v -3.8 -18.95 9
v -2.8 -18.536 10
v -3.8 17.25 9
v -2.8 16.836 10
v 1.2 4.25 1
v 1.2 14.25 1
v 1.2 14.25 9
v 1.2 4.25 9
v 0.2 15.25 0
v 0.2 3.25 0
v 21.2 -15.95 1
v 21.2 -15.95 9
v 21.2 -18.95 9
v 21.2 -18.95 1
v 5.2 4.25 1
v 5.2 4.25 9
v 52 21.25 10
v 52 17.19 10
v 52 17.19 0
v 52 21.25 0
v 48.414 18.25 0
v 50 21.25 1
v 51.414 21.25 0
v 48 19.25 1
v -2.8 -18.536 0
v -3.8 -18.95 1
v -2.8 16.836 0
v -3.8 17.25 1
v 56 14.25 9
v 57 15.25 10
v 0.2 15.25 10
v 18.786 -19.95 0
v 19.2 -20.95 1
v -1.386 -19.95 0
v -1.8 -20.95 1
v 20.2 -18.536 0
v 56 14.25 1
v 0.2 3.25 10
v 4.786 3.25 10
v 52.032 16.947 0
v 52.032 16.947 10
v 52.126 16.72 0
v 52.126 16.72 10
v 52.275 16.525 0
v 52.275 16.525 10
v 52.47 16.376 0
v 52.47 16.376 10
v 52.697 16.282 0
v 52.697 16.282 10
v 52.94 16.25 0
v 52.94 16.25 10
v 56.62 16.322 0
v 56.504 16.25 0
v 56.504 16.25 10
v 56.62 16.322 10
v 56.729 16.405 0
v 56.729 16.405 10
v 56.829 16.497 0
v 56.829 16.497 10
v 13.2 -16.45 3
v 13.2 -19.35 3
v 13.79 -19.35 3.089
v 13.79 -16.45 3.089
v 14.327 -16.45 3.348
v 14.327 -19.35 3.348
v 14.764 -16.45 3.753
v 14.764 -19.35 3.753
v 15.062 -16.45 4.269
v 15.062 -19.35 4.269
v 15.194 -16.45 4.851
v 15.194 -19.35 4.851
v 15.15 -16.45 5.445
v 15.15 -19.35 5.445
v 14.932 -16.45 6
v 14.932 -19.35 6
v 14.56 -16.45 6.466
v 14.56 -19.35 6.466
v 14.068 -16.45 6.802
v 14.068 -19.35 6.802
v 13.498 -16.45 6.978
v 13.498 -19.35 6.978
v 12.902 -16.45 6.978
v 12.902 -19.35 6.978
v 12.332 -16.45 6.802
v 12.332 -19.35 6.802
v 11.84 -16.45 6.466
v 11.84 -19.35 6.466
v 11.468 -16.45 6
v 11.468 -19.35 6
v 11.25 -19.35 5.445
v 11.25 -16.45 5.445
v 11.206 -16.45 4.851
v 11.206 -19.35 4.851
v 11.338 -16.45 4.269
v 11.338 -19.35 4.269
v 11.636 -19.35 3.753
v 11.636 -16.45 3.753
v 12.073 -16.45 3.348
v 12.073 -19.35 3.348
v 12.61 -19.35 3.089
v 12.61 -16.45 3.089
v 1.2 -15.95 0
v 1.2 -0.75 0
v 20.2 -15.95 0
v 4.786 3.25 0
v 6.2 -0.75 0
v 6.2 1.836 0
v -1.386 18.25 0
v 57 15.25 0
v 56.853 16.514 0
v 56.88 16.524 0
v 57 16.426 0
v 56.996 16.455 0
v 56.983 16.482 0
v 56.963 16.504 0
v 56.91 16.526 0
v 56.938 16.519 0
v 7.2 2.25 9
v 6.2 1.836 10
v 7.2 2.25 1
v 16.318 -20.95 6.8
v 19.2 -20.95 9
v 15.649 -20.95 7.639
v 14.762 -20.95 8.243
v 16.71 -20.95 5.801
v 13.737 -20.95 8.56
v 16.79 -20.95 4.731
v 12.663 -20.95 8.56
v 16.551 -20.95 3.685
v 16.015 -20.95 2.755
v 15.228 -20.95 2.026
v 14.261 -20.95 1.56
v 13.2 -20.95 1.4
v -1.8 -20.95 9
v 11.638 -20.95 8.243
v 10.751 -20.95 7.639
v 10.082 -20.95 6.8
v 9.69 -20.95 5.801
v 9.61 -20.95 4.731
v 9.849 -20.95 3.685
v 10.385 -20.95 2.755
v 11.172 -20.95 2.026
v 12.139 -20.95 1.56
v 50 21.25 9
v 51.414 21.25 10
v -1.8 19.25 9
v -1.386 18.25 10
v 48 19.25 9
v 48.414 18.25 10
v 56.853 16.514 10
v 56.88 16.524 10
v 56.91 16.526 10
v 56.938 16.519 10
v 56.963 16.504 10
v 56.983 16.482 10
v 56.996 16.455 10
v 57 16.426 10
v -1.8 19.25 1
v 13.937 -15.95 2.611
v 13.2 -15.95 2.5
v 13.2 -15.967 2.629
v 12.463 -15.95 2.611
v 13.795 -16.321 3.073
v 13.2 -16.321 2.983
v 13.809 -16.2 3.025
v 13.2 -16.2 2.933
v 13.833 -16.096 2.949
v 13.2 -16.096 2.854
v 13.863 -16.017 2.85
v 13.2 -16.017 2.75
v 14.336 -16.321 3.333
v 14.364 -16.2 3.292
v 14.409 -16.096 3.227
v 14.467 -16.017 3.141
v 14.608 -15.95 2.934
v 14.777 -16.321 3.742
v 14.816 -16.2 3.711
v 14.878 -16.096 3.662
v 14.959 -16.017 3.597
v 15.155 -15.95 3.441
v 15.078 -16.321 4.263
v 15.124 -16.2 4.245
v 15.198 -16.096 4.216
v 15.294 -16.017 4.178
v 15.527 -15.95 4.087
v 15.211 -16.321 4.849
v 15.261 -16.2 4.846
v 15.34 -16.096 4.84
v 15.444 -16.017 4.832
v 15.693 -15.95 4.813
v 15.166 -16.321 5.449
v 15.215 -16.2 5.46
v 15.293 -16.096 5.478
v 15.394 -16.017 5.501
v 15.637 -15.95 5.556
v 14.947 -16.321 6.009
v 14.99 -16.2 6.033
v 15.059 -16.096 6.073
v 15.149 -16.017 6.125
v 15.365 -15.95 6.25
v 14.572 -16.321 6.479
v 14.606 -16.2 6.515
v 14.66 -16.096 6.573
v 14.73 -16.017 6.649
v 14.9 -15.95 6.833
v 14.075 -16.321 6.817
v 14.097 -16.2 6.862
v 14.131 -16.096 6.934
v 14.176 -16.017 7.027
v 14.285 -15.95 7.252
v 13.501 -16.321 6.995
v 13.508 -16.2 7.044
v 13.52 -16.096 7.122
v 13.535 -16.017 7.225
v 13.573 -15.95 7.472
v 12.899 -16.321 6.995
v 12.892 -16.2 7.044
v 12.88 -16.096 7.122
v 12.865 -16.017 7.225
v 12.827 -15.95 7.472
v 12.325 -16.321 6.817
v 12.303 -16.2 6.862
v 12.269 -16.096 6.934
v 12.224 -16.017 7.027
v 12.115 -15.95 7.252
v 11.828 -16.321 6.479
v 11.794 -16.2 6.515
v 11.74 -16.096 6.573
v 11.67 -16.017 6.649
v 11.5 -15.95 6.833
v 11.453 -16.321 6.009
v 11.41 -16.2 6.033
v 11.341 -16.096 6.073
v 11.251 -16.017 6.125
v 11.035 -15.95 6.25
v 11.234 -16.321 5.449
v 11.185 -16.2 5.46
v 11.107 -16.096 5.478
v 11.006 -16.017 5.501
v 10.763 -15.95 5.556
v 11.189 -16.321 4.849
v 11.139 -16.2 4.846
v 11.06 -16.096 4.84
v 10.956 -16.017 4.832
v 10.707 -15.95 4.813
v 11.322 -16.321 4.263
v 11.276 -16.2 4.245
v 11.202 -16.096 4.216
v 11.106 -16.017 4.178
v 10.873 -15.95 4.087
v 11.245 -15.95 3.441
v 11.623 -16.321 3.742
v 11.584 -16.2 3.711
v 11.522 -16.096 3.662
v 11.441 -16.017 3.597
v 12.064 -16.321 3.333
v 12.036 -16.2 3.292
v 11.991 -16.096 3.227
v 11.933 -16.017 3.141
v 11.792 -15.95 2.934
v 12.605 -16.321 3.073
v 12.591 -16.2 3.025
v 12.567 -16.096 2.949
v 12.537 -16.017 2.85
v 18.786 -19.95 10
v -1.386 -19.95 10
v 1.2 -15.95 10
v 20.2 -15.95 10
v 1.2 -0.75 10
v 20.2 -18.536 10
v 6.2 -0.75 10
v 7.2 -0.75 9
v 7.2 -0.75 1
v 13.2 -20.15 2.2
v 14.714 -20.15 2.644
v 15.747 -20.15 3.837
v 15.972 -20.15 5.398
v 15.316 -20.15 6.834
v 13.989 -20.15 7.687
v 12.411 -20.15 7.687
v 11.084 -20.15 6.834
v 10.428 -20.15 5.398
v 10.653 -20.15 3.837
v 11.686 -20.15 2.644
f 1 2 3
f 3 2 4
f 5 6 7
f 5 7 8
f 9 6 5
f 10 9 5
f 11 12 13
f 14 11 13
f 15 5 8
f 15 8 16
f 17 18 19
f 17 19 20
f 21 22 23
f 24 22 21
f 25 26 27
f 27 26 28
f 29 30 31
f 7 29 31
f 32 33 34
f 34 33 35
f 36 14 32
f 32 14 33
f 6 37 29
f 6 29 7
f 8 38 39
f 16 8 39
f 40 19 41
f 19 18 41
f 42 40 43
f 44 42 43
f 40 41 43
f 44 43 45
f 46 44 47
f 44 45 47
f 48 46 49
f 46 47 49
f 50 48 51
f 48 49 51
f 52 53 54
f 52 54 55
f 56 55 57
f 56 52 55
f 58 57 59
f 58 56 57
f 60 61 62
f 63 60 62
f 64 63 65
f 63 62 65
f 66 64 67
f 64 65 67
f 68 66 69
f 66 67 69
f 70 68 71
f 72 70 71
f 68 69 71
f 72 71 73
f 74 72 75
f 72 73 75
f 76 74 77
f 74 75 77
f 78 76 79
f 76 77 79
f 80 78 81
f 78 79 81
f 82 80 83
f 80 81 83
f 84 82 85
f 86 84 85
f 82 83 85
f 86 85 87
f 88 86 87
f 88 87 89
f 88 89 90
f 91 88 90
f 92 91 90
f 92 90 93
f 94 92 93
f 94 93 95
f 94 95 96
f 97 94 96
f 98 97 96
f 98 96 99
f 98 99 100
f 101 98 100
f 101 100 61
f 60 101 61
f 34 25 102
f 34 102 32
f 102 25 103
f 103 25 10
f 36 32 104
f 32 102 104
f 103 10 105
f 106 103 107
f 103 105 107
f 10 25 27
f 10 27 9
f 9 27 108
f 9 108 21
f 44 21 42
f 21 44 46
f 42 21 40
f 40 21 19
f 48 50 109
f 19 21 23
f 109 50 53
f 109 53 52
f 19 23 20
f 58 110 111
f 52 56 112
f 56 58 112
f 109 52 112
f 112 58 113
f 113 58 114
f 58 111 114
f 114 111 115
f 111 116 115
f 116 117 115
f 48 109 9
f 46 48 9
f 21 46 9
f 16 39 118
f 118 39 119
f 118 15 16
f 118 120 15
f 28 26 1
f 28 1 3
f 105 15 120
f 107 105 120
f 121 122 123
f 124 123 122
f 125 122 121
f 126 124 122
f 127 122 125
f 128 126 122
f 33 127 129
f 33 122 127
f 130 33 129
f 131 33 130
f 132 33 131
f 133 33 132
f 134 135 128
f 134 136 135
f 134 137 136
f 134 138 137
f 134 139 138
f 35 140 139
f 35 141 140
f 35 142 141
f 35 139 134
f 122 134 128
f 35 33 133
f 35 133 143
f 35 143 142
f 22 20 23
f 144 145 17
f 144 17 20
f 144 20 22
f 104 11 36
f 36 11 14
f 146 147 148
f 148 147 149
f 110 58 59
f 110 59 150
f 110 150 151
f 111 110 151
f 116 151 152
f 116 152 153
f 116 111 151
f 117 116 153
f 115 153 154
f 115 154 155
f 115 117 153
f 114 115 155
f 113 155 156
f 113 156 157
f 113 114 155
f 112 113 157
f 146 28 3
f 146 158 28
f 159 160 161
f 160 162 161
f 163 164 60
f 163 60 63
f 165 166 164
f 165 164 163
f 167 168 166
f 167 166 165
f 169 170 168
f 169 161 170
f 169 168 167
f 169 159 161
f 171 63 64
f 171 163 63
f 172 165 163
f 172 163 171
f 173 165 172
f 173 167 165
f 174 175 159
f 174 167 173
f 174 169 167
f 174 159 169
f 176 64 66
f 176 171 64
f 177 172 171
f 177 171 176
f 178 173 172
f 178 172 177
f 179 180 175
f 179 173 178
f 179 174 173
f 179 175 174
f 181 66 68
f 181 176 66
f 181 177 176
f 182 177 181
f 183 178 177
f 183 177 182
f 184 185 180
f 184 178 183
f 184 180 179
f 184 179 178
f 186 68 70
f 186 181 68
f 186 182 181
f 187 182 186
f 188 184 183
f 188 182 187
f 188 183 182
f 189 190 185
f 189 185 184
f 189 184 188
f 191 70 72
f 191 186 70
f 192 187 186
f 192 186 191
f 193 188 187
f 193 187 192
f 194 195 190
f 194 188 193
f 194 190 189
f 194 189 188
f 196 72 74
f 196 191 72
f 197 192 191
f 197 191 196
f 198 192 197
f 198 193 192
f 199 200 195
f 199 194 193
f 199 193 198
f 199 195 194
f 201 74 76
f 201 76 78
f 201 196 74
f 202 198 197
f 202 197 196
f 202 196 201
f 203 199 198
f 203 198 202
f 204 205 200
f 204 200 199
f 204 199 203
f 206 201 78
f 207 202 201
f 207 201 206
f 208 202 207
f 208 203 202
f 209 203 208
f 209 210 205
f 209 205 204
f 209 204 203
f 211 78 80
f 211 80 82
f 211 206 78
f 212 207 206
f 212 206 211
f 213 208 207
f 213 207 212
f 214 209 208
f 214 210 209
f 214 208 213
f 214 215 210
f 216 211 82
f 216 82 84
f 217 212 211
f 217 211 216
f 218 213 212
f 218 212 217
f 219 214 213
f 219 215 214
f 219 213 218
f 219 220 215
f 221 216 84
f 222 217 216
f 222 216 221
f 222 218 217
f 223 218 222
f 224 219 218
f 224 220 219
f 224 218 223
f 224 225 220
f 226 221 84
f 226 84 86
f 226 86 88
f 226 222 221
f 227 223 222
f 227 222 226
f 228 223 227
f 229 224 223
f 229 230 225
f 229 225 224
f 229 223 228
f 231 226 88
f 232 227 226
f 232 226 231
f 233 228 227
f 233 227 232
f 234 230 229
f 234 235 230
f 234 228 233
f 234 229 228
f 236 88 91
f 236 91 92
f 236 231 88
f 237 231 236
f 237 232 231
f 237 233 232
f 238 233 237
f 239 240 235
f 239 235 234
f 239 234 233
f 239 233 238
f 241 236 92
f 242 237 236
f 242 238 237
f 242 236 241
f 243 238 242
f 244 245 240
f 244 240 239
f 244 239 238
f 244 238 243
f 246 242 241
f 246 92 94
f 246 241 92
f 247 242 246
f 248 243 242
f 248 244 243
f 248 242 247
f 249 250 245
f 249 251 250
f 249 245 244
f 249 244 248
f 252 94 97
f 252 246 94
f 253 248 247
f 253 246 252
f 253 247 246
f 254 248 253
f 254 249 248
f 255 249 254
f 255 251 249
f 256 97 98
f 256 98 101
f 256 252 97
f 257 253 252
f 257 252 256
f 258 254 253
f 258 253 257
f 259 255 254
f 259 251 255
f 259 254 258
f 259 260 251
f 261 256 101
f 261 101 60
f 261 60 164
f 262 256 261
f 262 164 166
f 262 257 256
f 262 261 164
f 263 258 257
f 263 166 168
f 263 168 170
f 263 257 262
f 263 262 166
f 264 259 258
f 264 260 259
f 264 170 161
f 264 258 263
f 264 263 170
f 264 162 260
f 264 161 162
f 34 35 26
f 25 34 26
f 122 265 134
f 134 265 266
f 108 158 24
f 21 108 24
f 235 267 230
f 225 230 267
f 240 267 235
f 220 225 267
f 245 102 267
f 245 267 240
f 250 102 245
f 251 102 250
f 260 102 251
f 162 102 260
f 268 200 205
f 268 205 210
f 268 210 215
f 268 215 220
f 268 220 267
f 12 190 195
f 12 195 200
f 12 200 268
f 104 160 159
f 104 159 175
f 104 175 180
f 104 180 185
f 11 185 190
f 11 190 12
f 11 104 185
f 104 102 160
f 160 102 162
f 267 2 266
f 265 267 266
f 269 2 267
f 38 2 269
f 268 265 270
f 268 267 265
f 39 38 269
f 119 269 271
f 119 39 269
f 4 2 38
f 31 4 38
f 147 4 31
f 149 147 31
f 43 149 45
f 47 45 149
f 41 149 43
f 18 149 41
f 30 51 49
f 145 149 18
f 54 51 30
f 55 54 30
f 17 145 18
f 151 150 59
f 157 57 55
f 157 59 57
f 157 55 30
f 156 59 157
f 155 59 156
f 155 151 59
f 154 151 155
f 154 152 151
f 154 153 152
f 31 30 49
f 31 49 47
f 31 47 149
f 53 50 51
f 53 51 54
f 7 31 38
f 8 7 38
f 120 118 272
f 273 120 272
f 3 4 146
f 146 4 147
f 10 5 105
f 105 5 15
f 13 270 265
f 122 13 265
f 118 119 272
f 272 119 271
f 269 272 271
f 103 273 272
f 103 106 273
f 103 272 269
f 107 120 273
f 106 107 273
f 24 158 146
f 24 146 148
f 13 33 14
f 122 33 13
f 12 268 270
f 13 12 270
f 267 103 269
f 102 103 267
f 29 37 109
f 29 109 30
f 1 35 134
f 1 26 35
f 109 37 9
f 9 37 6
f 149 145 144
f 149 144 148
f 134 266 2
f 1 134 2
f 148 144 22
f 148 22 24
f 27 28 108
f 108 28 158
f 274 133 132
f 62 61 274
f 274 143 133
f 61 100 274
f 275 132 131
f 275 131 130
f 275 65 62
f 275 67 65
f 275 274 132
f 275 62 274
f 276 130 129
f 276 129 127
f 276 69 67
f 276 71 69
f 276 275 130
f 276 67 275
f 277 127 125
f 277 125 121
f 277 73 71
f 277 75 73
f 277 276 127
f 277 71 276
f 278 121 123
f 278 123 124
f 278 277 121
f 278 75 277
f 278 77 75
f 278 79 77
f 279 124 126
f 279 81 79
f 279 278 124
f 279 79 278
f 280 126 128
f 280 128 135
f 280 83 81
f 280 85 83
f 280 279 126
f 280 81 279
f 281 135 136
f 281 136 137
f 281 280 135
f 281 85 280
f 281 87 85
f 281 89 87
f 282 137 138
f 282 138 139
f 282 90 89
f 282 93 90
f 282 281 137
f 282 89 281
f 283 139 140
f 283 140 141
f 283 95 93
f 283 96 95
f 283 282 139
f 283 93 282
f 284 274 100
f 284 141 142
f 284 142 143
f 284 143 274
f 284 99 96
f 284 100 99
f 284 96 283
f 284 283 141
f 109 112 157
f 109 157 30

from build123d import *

# Parameters (mm, degrees)
RESSALTO_EXTRUS_O1_DEPTH = 10
ESBO_O3_R                = 2
CORTE_EXTRUS_O1_DEPTH    = 15
CHANFRO1_SIZE            = 1.6
FILETE1_R                = 0.5
FILETE2_R                = 0.94
RESSALTO_EXTRUS_O3_DEPTH = 10
CHANFRO5_SIZE            = 2
CHANFRO4_SIZE            = 1


with BuildPart() as part:
    # Esboço1 → Ressalto-extrusão1 (new body)
    with BuildSketch(Plane.XY):
        with BuildLine():
            Line((57, 14.25), (1.2, 14.25))
            Line((1.2, 14.25), (1.2, 4.25))
            Line((1.2, 4.25), (7.2, 4.25))
            Line((7.2, 4.25), (7.2, -0.75))
            Line((7.2, -0.75), (1.2, -0.75))
            Line((1.2, -0.75), (1.2, -15.95))
            Line((1.2, -15.95), (21.2, -15.95))
            Line((21.2, -15.95), (21.2, -20.95))
            Line((21.2, -20.95), (-3.8, -20.95))
            Line((-3.8, -20.95), (-3.8, 19.25))
            Line((-3.8, 19.25), (52, 19.25))
            Line((52, 19.25), (52, 16.25))
            Line((52, 16.25), (56.504380809, 16.25))
            ThreePointArc((56.504380809, 16.25), (56.67525574, 16.362291088), (56.829148206, 16.496918869))
            ThreePointArc((56.829148206, 16.496918869), (56.938176044, 16.51877572), (57, 16.426349589))
            Line((57, 16.426349589), (57, 16.25))
            Line((57, 16.25), (57, 14.25))
        make_face()
    extrude(amount=RESSALTO_EXTRUS_O1_DEPTH)

    # Esboço3 → Corte-extrusão1 (cut)
    with BuildSketch(Plane.XZ.offset(20.95)):
        with Locations(Location((13.2, 5, 0), (0, 0, 270))):
            Circle(ESBO_O3_R)
    extrude(amount=-CORTE_EXTRUS_O1_DEPTH, mode=Mode.SUBTRACT)

    # Chanfro1
    chanfro1_edges = [part.edges().sort_by_distance(p)[0] for p in [
        (13.2, -20.95, 7),
    ]]
    chamfer(chanfro1_edges, length=CHANFRO1_SIZE)

    # Filete1
    filete1_edges = [part.edges().sort_by_distance(p)[0] for p in [
        (13.2, -15.95, 7),
    ]]
    fillet(filete1_edges, radius=FILETE1_R)

    # Filete2
    filete2_edges = [part.edges().sort_by_distance(p)[0] for p in [
        (52, 16.25, 5),
    ]]
    fillet(filete2_edges, radius=FILETE2_R)

    # Esboço5 → Ressalto-extrusão3 (add)
    with BuildSketch(Plane.XY.offset(10)):
        Polygon((52, 19.25), (52, 21.25), (50, 21.25), (48, 19.25), align=None)
    extrude(amount=-RESSALTO_EXTRUS_O3_DEPTH)

    # Chanfro5
    chanfro5_edges = [part.edges().sort_by_distance(p)[0] for p in [
        (21.2, -20.95, 5),
        (-3.8, -20.95, 5),
        (-3.8, 19.25, 5),
        (7.2, 4.25, 5),
    ]]
    chamfer(chanfro5_edges, length=CHANFRO5_SIZE)

    # Chanfro4
    chanfro4_edges = [part.edges().sort_by_distance(p)[0] for p in [
        (1.2, 9.25, 10),
        (29.1, 14.25, 10),
        (29.1, 14.25, 0),
        (1.2, 9.25, 0),
        (7.2, 0.75, 0),
        (57, 14.25, 5),
        (7.2, 0.75, 10),
        (23.1, 19.25, 0),
        (23.1, 19.25, 10),
        (49, 20.25, 10),
        (49, 20.25, 0),
        (8.7, -20.95, 0),
        (8.7, -20.95, 10),
        (21.2, -17.45, 0),
        (-3.8, -0.85, 0),
        (3.2, 4.25, 0),
        (-2.8, 18.25, 0),
        (6.2, 3.25, 0),
        (20.2, -19.95, 0),
        (-2.8, -19.95, 0),
        (-3.8, -0.85, 10),
        (3.2, 4.25, 10),
        (21.2, -17.45, 10),
        (-2.8, 18.25, 10),
        (6.2, 3.25, 10),
        (20.2, -19.95, 10),
        (-2.8, -19.95, 10),
    ]]
    chamfer(chanfro4_edges, length=CHANFRO4_SIZE)


solid = part.part
